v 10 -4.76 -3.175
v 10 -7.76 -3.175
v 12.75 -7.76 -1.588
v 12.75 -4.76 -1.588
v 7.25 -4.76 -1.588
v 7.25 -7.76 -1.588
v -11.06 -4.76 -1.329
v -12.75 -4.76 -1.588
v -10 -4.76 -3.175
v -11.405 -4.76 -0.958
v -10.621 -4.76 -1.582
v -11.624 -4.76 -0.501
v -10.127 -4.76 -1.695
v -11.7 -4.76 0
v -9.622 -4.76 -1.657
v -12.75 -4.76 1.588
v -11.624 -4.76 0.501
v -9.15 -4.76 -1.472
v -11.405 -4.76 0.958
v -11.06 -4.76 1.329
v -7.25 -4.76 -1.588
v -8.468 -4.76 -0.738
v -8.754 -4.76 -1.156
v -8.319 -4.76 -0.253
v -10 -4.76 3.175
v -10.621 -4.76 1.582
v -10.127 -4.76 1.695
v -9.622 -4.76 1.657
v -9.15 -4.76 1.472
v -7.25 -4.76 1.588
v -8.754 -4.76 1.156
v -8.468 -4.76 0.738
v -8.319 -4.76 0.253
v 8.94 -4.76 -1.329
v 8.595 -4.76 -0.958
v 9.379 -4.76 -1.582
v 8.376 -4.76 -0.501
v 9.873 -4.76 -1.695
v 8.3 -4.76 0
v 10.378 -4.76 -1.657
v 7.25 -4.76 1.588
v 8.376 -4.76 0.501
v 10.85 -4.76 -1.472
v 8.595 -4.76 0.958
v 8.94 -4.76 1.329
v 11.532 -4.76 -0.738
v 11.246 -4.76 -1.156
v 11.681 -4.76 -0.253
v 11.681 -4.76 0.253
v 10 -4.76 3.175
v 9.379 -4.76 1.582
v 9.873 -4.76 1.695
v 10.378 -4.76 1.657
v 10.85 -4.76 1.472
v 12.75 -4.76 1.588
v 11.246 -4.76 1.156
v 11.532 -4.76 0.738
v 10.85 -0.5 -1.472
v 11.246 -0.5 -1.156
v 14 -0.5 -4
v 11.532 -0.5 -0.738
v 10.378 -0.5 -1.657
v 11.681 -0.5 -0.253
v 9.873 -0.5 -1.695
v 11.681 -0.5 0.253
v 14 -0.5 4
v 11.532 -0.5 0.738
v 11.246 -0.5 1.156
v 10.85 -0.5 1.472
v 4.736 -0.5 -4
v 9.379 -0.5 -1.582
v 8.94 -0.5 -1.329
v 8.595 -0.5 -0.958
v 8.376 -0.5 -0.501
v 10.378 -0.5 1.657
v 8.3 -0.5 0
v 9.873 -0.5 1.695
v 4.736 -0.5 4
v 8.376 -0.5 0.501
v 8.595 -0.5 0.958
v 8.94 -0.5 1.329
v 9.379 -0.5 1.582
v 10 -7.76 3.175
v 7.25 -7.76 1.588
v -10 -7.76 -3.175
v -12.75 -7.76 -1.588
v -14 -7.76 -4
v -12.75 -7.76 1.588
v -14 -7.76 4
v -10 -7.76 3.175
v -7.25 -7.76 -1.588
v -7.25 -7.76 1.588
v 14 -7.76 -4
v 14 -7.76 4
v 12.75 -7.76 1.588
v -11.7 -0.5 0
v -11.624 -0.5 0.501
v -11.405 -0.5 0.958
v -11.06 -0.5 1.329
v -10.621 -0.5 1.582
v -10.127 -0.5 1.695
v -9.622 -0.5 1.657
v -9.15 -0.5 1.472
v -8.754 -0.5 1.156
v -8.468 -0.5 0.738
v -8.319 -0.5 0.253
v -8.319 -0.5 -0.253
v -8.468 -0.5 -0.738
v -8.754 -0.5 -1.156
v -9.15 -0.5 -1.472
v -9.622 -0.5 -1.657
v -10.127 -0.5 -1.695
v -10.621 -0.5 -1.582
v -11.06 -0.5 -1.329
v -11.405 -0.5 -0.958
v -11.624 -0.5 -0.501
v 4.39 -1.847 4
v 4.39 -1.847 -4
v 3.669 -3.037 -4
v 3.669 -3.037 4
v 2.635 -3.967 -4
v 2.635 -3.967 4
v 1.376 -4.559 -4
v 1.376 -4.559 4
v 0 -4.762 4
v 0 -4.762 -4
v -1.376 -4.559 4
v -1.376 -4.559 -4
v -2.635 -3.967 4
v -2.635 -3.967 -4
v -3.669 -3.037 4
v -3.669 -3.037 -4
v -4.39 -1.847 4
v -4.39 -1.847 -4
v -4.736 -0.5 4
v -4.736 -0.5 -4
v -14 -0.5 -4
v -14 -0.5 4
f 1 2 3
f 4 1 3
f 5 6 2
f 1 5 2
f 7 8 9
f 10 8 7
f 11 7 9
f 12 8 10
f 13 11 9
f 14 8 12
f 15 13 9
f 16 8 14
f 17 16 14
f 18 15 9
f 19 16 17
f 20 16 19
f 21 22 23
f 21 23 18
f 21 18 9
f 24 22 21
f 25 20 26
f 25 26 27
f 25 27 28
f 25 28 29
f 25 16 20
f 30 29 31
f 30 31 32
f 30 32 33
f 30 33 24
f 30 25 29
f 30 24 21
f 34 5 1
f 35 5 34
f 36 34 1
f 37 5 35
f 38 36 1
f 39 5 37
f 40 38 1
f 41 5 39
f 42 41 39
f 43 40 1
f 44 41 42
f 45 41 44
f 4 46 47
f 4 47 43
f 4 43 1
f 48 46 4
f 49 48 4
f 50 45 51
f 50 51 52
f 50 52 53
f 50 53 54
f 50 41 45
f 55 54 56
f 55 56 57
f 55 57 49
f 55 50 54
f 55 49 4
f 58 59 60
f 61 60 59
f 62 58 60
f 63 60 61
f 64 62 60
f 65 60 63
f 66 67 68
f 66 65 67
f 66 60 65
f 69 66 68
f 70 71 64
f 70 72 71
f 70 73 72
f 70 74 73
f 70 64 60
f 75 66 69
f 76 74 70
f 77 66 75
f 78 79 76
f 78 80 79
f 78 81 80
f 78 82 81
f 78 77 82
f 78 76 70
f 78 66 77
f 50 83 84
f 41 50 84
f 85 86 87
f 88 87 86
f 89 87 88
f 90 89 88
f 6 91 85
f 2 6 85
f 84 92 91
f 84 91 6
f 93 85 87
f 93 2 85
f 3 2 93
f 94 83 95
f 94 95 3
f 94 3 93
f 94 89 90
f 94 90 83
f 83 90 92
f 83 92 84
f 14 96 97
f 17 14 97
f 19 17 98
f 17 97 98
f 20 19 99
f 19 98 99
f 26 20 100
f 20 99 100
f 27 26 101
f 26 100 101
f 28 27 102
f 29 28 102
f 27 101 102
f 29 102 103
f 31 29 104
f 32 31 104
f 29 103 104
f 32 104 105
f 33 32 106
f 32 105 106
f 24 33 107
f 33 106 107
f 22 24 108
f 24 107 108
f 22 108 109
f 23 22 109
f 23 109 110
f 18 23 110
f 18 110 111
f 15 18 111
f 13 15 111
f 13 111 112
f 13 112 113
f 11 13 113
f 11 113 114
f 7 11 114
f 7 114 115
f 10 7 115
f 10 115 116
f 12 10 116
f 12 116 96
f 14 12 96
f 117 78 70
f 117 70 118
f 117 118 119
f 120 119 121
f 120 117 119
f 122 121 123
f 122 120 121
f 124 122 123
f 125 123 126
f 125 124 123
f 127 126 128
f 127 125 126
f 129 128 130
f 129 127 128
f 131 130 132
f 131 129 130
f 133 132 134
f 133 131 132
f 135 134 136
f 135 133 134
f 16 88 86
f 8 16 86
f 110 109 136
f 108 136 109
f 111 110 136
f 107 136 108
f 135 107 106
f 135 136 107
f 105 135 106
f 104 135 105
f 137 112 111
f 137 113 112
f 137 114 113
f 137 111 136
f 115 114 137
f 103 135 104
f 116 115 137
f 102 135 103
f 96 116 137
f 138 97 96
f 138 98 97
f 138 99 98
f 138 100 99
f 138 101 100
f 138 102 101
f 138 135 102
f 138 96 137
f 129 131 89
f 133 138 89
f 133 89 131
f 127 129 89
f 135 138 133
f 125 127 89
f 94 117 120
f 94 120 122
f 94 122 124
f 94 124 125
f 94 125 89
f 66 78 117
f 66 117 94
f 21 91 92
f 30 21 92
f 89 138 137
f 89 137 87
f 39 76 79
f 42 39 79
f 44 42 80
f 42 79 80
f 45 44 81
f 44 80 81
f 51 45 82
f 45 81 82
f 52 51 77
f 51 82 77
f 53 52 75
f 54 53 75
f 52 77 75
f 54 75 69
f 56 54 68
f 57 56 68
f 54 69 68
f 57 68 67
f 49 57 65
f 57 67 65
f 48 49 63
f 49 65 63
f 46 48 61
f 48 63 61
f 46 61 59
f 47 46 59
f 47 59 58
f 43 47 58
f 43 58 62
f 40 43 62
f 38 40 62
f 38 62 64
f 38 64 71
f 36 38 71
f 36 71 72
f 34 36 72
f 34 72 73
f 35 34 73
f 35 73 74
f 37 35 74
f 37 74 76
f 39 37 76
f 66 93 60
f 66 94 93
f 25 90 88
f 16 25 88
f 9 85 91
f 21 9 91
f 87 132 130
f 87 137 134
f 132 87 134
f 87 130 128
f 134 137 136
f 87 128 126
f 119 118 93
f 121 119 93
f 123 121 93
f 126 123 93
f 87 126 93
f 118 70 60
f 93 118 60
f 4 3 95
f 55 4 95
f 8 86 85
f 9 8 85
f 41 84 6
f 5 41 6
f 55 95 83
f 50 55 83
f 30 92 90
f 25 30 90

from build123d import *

# Parameters (mm, degrees)
BOSS_EXTRUDE1_DEPTH  = 4
M3_CLEARANCE_HOLE1_D = 3.4
CUT_EXTRUDE1_DEPTH   = 3


with BuildPart() as part:
    # Sketch1 → Boss-Extrude1 (new, symmetric)
    with BuildSketch(Plane.XY):
        with BuildLine():
            Line((14, -0.5), (4.736180555, -0.5))
            ThreePointArc((4.736180555, -0.5), (0, -4.7625), (-4.736180555, -0.5))
            Line((-4.736180555, -0.5), (-14, -0.5))
            Line((-14, -0.5), (-14, -7.76))
            Line((-14, -7.76), (14, -7.76))
            Line((14, -7.76), (14, -0.5))
        make_face()
    extrude(amount=BOSS_EXTRUDE1_DEPTH, both=True)

    # M3 Clearance Hole1 (through all)
    with Locations(Plane.XZ.offset(7.76)):
        with Locations((-10, 0), (10, 0)):
            Hole(M3_CLEARANCE_HOLE1_D / 2)

    # Sketch5 → Cut-Extrude1 (cut)
    with BuildSketch(Plane.XZ.offset(7.76)):
        Polygon((-7.25, -1.58771324), (-7.25, 1.58771324), (-10, 3.175426481), (-12.75, 1.58771324), (-12.75, -1.58771324), (-10, -3.175426481), align=None)
        Polygon((7.25, -1.58771324), (10, -3.175426481), (12.75, -1.58771324), (12.75, 1.58771324), (10, 3.175426481), (7.25, 1.58771324), align=None)
    extrude(amount=-CUT_EXTRUDE1_DEPTH, mode=Mode.SUBTRACT)


solid = part.part
